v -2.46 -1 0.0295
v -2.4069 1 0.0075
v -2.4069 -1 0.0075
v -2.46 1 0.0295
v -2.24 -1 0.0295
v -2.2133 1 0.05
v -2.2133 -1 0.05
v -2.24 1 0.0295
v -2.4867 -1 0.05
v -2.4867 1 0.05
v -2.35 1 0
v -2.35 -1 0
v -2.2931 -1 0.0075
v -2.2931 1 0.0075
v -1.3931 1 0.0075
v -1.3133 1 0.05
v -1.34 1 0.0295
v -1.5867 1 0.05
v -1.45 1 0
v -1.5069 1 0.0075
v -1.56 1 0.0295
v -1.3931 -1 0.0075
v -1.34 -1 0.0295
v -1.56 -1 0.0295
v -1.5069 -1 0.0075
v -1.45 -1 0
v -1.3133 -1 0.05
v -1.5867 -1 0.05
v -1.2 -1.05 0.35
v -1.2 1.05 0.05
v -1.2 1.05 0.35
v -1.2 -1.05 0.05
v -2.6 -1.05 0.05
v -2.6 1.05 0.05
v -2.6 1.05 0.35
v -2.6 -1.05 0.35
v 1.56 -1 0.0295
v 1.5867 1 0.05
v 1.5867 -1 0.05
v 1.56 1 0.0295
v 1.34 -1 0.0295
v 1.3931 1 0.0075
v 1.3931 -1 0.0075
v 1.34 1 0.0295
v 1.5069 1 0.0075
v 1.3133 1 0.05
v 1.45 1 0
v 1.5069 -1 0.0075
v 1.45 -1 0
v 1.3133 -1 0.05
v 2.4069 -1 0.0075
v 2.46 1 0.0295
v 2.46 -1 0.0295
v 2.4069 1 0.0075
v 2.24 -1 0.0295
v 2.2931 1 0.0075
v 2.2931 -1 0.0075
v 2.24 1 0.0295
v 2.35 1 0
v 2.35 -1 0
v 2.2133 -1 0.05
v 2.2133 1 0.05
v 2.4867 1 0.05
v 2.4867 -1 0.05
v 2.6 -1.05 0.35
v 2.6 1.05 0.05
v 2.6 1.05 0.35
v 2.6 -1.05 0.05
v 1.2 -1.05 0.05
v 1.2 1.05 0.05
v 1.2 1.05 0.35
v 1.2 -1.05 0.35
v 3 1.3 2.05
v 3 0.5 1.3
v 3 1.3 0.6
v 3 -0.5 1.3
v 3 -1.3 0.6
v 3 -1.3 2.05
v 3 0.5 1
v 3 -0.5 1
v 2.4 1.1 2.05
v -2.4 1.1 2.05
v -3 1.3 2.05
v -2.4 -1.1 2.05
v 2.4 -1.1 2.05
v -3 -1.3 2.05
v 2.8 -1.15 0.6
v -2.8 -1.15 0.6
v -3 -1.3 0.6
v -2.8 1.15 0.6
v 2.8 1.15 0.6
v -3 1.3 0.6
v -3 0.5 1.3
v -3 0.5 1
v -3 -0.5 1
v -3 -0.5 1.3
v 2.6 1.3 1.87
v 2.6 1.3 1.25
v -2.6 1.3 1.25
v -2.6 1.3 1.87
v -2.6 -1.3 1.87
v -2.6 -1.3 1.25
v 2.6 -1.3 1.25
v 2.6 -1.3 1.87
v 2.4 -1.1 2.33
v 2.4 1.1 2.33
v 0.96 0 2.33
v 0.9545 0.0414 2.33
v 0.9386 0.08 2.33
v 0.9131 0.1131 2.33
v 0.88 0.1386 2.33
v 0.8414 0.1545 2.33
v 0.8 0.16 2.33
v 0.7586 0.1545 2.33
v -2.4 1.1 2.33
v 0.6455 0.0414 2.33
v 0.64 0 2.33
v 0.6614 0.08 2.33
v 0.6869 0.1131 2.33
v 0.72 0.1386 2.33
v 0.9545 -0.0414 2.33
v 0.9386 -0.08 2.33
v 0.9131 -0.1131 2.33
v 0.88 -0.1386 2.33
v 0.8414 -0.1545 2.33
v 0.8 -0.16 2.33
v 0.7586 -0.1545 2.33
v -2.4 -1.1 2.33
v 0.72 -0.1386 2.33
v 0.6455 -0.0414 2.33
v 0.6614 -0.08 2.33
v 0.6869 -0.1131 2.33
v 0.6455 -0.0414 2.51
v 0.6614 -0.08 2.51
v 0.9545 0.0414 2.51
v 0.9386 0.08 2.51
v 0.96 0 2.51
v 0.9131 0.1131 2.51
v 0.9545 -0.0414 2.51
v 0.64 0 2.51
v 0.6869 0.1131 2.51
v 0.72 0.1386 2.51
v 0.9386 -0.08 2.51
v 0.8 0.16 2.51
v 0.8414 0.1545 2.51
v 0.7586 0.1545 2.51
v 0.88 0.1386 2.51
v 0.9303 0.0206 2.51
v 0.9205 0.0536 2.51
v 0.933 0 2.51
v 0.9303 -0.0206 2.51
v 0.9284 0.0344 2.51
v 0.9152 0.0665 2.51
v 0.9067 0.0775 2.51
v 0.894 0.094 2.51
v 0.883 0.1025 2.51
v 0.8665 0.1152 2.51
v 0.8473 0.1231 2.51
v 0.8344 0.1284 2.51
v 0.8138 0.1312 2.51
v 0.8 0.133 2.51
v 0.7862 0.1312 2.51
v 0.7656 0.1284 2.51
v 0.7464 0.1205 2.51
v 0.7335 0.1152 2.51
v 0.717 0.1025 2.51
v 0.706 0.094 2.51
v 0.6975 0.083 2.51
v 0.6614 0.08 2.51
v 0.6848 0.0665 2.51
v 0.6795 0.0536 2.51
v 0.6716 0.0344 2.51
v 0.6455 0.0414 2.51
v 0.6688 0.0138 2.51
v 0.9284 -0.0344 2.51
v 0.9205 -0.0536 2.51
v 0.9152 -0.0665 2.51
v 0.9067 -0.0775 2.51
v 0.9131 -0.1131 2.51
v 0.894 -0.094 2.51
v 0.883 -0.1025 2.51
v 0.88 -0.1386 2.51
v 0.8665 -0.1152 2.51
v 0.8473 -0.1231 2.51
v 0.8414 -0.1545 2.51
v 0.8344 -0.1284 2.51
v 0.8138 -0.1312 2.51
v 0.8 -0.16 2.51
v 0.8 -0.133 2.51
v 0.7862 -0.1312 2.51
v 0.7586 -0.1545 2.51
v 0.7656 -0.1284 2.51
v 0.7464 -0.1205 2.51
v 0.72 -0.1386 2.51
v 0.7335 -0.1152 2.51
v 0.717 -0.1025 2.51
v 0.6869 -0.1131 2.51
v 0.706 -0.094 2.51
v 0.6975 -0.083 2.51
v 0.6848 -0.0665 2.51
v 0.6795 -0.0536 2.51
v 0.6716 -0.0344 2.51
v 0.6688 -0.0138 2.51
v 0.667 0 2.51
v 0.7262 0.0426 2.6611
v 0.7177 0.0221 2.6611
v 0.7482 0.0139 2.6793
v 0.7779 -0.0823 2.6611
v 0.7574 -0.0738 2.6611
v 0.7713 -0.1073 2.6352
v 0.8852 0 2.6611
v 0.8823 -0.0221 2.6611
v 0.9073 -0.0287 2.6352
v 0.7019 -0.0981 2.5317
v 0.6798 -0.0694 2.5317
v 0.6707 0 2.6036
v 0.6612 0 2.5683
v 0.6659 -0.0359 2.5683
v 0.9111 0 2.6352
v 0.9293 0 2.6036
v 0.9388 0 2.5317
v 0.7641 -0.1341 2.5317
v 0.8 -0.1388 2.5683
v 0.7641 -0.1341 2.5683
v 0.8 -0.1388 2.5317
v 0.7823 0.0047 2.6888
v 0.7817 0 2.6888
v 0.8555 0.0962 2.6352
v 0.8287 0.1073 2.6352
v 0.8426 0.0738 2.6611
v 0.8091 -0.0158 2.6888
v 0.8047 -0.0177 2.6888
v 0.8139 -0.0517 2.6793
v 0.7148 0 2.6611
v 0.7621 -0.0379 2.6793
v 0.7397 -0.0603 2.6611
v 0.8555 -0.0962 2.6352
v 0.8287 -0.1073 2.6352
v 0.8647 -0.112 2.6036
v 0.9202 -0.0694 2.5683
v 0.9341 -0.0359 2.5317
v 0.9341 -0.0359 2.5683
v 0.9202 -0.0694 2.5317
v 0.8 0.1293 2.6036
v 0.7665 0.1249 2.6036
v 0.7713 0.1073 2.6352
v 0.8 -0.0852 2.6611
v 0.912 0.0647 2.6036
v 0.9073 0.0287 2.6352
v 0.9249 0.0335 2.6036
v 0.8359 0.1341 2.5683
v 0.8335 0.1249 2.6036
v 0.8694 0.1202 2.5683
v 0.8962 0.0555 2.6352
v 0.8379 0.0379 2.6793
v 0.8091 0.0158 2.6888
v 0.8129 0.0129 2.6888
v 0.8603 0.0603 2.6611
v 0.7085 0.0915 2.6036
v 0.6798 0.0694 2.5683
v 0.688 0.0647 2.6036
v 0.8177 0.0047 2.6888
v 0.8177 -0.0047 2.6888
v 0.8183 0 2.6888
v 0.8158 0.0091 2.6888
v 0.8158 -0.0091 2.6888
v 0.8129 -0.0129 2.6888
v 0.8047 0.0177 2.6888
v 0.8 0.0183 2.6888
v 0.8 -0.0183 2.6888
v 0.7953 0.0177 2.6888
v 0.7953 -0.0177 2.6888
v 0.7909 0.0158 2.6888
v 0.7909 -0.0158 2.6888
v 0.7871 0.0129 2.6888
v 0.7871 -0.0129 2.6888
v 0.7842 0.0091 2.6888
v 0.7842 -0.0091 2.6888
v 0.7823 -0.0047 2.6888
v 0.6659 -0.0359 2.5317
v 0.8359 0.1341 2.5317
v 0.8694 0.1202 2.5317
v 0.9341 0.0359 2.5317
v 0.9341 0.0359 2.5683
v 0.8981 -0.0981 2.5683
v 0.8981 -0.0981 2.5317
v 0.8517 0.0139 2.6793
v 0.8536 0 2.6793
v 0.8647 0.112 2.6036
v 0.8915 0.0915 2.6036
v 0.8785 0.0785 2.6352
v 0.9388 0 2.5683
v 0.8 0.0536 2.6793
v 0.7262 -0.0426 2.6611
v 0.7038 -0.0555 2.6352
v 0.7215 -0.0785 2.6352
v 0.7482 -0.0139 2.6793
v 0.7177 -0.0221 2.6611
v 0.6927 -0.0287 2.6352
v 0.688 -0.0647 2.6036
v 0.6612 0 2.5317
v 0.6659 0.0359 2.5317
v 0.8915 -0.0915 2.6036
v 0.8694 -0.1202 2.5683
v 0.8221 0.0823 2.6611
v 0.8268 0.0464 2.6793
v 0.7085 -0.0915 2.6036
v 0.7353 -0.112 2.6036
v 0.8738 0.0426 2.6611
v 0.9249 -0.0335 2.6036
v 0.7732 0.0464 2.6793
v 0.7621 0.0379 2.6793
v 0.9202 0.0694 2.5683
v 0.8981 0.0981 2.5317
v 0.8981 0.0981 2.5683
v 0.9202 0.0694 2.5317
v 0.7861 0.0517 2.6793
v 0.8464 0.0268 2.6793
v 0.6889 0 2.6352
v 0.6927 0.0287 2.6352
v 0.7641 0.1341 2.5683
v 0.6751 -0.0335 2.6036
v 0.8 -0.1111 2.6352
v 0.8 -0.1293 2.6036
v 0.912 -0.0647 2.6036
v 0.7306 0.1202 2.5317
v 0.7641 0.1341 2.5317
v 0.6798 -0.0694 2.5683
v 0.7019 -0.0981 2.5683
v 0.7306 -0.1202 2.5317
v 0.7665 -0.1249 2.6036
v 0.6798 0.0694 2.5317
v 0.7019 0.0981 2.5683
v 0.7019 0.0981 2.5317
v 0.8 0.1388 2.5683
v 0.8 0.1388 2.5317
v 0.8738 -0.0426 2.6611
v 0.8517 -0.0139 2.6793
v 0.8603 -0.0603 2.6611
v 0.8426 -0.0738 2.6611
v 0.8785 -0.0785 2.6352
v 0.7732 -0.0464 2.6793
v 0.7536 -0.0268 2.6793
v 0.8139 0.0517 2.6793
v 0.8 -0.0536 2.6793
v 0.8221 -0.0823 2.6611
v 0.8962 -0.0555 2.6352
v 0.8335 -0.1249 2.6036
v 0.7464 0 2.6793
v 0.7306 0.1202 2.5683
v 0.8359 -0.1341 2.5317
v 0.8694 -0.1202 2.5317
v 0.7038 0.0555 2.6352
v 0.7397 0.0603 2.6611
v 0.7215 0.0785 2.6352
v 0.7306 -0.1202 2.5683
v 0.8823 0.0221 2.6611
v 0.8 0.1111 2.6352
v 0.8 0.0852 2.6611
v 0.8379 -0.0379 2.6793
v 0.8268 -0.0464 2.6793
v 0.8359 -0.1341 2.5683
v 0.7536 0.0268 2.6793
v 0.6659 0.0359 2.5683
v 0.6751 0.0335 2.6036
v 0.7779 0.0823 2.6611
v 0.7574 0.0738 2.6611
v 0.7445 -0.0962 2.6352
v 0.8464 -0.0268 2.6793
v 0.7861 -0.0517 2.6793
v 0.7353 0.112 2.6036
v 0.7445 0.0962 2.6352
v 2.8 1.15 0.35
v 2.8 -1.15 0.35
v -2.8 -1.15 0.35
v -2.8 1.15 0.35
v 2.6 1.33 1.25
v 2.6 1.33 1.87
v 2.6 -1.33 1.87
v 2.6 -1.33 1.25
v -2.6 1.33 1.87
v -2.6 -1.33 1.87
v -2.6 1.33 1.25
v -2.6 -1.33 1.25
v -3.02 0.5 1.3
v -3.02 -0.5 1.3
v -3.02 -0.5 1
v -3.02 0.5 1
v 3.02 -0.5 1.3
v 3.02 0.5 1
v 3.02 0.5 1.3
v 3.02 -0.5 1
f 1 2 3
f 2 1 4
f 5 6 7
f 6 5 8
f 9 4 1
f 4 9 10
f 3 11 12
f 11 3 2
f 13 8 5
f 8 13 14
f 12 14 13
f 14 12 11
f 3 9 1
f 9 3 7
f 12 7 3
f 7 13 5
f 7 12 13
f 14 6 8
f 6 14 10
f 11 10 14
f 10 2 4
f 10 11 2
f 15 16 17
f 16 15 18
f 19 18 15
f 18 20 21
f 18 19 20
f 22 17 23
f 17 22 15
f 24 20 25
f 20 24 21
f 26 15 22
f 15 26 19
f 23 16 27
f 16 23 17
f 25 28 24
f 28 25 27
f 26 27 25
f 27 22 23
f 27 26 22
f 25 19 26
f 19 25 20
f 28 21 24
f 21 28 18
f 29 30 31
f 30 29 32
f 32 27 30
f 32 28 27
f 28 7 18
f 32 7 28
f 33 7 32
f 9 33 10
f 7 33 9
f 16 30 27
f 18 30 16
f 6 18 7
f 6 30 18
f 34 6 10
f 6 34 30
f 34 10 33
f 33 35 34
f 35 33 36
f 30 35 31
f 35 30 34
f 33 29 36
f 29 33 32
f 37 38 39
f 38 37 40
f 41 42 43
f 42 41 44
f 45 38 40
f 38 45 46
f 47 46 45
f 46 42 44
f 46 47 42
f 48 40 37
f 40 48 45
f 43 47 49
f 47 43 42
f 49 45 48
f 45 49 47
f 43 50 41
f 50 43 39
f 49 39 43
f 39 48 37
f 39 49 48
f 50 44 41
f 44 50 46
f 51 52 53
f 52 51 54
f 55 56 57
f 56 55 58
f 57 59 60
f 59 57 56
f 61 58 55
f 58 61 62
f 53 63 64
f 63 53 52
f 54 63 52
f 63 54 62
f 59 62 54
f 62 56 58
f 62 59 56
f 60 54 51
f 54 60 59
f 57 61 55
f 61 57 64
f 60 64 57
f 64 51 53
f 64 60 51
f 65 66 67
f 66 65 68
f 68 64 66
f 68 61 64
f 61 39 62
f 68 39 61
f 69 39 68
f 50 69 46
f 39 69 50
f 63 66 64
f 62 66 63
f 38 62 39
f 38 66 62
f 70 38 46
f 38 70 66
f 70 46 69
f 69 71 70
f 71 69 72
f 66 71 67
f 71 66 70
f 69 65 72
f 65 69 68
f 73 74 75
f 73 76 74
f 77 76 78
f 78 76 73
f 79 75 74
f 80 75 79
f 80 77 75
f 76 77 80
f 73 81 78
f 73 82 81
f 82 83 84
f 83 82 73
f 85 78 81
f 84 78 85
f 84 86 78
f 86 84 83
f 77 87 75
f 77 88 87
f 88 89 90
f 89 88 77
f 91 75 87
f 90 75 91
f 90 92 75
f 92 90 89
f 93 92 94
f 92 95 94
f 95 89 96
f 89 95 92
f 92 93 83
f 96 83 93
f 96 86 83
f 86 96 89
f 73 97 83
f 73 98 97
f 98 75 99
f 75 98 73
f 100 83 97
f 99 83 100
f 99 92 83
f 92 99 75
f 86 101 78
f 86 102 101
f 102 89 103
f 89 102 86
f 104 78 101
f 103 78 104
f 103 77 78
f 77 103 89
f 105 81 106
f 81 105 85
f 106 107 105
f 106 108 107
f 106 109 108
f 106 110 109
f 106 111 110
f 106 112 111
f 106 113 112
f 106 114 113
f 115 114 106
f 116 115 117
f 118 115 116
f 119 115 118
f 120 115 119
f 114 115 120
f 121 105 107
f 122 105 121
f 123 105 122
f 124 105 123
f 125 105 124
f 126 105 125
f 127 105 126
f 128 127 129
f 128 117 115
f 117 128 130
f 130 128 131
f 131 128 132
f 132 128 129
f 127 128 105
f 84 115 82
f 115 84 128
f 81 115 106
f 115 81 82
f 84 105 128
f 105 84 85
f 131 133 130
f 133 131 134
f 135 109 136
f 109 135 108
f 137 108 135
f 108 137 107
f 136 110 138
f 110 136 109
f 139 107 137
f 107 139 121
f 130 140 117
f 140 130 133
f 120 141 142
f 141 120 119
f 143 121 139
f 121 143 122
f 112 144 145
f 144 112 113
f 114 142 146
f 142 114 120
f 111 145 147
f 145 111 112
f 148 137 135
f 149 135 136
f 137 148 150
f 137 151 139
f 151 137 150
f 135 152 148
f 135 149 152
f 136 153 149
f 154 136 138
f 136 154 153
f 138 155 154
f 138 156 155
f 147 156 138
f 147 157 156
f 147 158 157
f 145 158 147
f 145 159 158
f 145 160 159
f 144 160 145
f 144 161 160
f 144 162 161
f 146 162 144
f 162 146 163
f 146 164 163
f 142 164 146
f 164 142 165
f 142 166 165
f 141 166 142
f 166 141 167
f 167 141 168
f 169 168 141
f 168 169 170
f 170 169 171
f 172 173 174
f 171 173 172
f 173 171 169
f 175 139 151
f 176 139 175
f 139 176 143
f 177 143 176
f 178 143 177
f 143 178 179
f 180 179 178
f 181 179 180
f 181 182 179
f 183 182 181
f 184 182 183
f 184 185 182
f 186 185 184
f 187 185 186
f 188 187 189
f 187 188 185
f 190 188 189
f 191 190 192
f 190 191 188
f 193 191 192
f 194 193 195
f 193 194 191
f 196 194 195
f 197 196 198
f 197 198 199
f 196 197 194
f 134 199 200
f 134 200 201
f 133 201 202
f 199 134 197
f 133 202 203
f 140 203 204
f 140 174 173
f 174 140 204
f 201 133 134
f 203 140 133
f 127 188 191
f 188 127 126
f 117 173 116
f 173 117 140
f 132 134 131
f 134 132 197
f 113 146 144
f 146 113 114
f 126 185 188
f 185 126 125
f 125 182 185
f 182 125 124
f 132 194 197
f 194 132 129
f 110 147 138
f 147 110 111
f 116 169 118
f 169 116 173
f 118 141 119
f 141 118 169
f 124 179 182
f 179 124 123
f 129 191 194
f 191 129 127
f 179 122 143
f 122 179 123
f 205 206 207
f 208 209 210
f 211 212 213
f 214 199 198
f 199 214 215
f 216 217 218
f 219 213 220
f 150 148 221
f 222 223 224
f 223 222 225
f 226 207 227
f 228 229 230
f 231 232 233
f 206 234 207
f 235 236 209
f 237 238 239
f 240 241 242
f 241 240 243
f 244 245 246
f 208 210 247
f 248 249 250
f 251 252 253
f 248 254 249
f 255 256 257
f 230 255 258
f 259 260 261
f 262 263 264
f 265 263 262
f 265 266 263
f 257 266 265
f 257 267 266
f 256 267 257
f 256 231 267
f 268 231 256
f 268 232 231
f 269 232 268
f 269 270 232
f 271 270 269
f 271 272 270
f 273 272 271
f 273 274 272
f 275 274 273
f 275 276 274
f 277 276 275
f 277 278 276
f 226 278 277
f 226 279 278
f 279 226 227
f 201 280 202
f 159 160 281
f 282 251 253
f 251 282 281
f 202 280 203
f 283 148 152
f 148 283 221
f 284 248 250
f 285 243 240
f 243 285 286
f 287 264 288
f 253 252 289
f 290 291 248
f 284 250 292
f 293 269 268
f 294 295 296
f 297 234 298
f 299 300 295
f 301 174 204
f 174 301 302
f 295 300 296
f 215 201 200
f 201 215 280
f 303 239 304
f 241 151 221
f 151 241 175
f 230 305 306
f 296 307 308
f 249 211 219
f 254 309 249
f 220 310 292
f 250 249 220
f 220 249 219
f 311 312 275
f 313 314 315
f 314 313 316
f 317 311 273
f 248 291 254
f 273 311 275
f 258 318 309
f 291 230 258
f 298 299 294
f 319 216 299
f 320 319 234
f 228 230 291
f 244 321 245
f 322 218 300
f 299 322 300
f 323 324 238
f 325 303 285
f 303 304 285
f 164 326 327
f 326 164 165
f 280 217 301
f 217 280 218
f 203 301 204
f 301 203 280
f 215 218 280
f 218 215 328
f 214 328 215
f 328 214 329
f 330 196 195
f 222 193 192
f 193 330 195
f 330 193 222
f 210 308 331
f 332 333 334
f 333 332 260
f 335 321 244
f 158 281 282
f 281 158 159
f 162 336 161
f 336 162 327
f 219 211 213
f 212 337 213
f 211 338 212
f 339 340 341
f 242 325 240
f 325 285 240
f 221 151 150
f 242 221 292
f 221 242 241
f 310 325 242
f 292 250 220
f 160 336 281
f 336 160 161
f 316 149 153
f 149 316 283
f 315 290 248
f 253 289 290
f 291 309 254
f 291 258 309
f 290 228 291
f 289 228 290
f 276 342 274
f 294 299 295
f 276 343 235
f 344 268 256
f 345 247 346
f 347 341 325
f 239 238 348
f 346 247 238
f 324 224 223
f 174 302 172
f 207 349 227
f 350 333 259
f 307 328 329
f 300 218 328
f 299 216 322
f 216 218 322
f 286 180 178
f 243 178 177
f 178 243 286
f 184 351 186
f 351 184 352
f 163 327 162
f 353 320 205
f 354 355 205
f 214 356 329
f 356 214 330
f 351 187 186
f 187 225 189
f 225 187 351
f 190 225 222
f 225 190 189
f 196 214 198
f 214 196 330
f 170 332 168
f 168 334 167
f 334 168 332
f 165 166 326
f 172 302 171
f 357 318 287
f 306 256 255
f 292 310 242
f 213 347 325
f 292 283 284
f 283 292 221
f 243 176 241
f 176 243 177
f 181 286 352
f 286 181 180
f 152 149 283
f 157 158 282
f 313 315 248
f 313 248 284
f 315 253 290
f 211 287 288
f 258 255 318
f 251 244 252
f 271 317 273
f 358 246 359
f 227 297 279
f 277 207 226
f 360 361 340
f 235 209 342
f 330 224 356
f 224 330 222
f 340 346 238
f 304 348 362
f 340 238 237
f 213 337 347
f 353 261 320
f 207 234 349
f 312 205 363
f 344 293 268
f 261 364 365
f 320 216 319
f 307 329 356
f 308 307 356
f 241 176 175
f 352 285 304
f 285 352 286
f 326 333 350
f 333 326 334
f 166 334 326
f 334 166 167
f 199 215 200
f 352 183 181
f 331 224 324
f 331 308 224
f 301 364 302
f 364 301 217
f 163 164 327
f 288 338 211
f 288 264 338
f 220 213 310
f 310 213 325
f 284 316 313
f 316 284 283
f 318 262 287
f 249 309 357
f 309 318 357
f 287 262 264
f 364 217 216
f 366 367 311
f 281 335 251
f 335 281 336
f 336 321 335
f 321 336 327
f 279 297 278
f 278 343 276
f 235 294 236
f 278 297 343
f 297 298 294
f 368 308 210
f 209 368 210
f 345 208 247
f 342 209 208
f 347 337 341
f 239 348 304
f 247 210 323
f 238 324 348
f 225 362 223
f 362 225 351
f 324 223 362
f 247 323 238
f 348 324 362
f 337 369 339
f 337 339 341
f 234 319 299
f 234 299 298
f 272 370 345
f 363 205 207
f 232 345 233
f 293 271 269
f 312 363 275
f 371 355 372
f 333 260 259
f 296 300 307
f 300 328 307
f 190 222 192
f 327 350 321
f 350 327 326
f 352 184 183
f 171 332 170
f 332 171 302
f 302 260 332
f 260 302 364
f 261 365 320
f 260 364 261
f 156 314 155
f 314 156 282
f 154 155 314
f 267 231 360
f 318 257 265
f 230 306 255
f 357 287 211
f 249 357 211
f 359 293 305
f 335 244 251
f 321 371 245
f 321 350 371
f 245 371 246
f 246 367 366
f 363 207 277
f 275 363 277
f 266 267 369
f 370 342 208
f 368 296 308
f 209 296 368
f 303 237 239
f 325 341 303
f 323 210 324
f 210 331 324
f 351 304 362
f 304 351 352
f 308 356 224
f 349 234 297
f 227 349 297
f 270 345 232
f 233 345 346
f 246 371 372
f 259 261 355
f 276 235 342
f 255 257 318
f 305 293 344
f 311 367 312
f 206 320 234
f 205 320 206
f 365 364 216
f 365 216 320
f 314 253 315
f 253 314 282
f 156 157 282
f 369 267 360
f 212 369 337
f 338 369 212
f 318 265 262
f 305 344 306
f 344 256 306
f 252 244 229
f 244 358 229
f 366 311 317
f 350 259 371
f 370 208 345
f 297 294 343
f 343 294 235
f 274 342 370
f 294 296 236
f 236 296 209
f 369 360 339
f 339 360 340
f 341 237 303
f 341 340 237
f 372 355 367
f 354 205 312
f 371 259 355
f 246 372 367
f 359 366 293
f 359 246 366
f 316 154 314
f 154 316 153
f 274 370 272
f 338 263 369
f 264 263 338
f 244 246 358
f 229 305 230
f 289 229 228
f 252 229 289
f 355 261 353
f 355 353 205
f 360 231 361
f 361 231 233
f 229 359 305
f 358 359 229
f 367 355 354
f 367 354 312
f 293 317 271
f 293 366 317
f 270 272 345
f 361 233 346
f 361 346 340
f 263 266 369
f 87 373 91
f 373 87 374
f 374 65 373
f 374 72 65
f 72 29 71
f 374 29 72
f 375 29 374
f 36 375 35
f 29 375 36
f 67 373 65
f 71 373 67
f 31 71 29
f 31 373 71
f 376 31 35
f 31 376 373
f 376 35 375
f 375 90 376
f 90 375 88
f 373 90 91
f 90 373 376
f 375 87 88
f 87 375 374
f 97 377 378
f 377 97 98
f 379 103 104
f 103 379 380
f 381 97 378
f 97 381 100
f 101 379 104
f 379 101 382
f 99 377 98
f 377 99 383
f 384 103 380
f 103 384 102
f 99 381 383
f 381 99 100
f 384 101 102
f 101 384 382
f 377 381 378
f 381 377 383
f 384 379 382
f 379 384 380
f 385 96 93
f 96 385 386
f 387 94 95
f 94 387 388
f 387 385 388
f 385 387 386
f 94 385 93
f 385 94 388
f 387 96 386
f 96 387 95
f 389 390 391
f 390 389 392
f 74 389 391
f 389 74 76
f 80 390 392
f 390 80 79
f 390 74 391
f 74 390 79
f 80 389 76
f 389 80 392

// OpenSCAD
// Detroit Automation Academy — Forge Line vehicle prototypes
// Parametric OpenSCAD models. Units = meters. Export per-vehicle STLs:
//   openscad -D vehicle='"pod"' -o pod.stl transit.scad
// PNG renders for the site:
//   openscad -D vehicle='"pod"' -o pod.png --camera=0,0,1,65,0,30,11 --imgsize=800,600 --autocenter transit.scad

vehicle = "pod"; // pod | hauler | tender | heritage
$fn = 24;

ORANGE = [0.91, 0.36, 0.10];  // Forge Orange #E85D1A
DARK   = [0.10, 0.12, 0.14];  // Midnight
STEEL  = [0.55, 0.58, 0.62];  // Concrete
CREAM  = [0.96, 0.95, 0.92];  // Paper
GREEN  = [0.18, 0.49, 0.31];  // heritage green
AMBER  = [1.00, 0.69, 0.00];  // Amber #FFB000
GLASS  = [0.12, 0.20, 0.26];

module bogie(x, w) {
  // guideway bogie: dark truck + wheel hints
  color(DARK) {
    translate([x - 0.7, -w/2 + 0.25, 0.05]) cube([1.4, w - 0.5, 0.35]);
    for (sx = [-0.45, 0.45])
      translate([x + sx, 0, 0.22]) rotate([90, 0, 0])
        cylinder(r = 0.22, h = w - 0.6, center = true);
  }
}

// ---- 1. Forge Pod: automated passenger pod (elevated guideway) ----
module pod() {
  L = 6; W = 2.6;
  bogie(-1.9, W); bogie(1.9, W);
  color(DARK) translate([-L/2 + 0.2, -W/2 + 0.15, 0.35]) cube([L - 0.4, W - 0.3, 0.3]); // skirt
  color(ORANGE) {
    translate([-L/2, -W/2, 0.6]) cube([L, W, 1.45]);                       // hull
    translate([-L/2 + 0.6, -W/2 + 0.2, 2.05]) cube([L - 1.2, W - 0.4, 0.28]); // roof cap
  }
  color(GLASS) translate([-L/2 + 0.4, -W/2 - 0.03, 1.25]) cube([L - 0.8, W + 0.06, 0.62]); // window band
  color(DARK) {
    translate([0.8, 0, 2.33]) cylinder(r = 0.16, h = 0.18);                // sensor mast
    translate([0.8, 0, 2.55]) sphere(r = 0.14);                            // sensor dome
  }
  color(AMBER) translate([-L/2 - 0.02, -0.5, 1.0]) cube([0.06, 1.0, 0.3]);  // tail light bar
  color([1, 0.95, 0.8]) translate([L/2 - 0.04, -0.5, 1.0]) cube([0.06, 1.0, 0.3]); // headlight bar
}

// ---- 2. Forge Hauler: cargo pod (equipment & materials) ----
module hauler() {
  L = 5; W = 2.6;
  bogie(-1.5, W); bogie(1.5, W);
  color(DARK) translate([-L/2 + 0.2, -W/2 + 0.15, 0.35]) cube([L - 0.4, W - 0.3, 0.3]);
  color(STEEL) translate([-L/2, -W/2, 0.6]) cube([L, W, 2.1]);             // cargo box
  color(ORANGE) translate([-L/2 - 0.02, -W/2 - 0.02, 1.5]) cube([L + 0.04, W + 0.04, 0.35]); // livery stripe
  color(DARK) {                                                            // cargo doors (both sides)
    for (s = [-1, 1])
      translate([-1.6, s * (W/2 - 0.02), 0.9]) cube([3.2, 0.06, 1.5]);
  }
  color(STEEL) translate([-L/2 + 0.4, -W/2 + 0.4, 2.7]) cube([L - 0.8, W - 0.8, 0.12]); // roof panel
  color(DARK) translate([L/2 - 0.9, 0, 2.82]) cylinder(r = 0.12, h = 0.14); // roof vent
}

// ---- 3. Line Tender: guideway inspection & maintenance rig ----
module tender() {
  L = 4; W = 2.4;
  bogie(-1.2, W); bogie(1.2, W);
  color(DARK) translate([-L/2, -W/2, 0.55]) cube([L, W, 0.25]);            // flatbed
  color(ORANGE) translate([L/2 - 1.3, -W/2 + 0.15, 0.8]) cube([1.15, W - 0.3, 0.95]); // cab
  color(GLASS) translate([L/2 - 1.25, -W/2 + 0.3, 1.25]) cube([0.5, W - 0.6, 0.4]);   // cab window
  color(AMBER) translate([L/2 - 0.75, 0, 1.85]) sphere(r = 0.11);          // beacon
  color(STEEL) {                                                           // sensor mast
    translate([-L/2 + 0.5, 0, 0.8]) cylinder(r = 0.07, h = 2.1);
    translate([-L/2 + 0.5, 0, 2.9]) cube([0.5, 0.3, 0.22], center = true); // sensor head
  }
  color(ORANGE) {                                                          // work-platform railing
    for (x = [-L/2 + 0.2 : 0.6 : L/2 - 1.6], s = [-1, 1])
      translate([x, s * (W/2 - 0.08), 0.8]) cylinder(r = 0.03, h = 0.9);
    for (s = [-1, 1])
      translate([-L/2 + 0.2, s * (W/2 - 0.08), 1.66]) cube([L - 1.8, 0.06, 0.06]);
  }
  color(DARK) translate([-L/2 + 0.3, -0.7, 0.8]) cube([0.9, 1.4, 0.5]);    // toolbox
}

// ---- 4. Heritage Car: Phase-2 at-grade streetcar (QLINE homage) ----
module heritage() {
  L = 8; W = 2.5;
  color(DARK) {                                                            // trucks + wheels
    for (x = [-2.4, 2.4]) {
      translate([x - 0.8, -W/2 + 0.3, 0.15]) cube([1.6, W - 0.6, 0.3]);
      for (sx = [-0.5, 0.5])
        translate([x + sx, 0, 0.32]) rotate([90, 0, 0])
          cylinder(r = 0.32, h = W - 0.7, center = true);
    }
  }
  color(CREAM) translate([-L/2, -W/2, 0.55]) cube([L, W, 1.9]);            // body
  color(GREEN) {                                                           // window band + roof
    translate([-L/2 + 0.3, -W/2 - 0.03, 1.5]) cube([L - 0.6, W + 0.06, 0.7]);
    translate([-L/2, -W/2, 2.45]) cube([L, W, 0.28]);
    translate([-L/2 + 1.5, -W/2 + 0.5, 2.73]) cube([L - 3, W - 1, 0.35]);   // clerestory
  }
  color(GLASS) translate([-L/2 + 1.7, -W/2 + 0.62, 2.78]) cube([L - 3.4, W - 1.24, 0.22]);
  color(DARK) {                                                            // trolley pole
    translate([0.5, 0, 2.9]) rotate([0, -32, 0]) cylinder(r = 0.035, h = 2.6);
  }
  color(AMBER) translate([L/2 - 0.05, 0, 1.1]) sphere(r = 0.14);           // headlamp
  color(CREAM) translate([-L/2 - 0.25, -0.9, 0.55]) cube([0.25, 1.8, 0.5]); // pilot (cowcatcher hint)
}

// ---------- vehicle selector ----------
if (vehicle == "pod") { pod(); }
else if (vehicle == "hauler") { hauler(); }
else if (vehicle == "tender") { tender(); }
else if (vehicle == "heritage") { heritage(); }
